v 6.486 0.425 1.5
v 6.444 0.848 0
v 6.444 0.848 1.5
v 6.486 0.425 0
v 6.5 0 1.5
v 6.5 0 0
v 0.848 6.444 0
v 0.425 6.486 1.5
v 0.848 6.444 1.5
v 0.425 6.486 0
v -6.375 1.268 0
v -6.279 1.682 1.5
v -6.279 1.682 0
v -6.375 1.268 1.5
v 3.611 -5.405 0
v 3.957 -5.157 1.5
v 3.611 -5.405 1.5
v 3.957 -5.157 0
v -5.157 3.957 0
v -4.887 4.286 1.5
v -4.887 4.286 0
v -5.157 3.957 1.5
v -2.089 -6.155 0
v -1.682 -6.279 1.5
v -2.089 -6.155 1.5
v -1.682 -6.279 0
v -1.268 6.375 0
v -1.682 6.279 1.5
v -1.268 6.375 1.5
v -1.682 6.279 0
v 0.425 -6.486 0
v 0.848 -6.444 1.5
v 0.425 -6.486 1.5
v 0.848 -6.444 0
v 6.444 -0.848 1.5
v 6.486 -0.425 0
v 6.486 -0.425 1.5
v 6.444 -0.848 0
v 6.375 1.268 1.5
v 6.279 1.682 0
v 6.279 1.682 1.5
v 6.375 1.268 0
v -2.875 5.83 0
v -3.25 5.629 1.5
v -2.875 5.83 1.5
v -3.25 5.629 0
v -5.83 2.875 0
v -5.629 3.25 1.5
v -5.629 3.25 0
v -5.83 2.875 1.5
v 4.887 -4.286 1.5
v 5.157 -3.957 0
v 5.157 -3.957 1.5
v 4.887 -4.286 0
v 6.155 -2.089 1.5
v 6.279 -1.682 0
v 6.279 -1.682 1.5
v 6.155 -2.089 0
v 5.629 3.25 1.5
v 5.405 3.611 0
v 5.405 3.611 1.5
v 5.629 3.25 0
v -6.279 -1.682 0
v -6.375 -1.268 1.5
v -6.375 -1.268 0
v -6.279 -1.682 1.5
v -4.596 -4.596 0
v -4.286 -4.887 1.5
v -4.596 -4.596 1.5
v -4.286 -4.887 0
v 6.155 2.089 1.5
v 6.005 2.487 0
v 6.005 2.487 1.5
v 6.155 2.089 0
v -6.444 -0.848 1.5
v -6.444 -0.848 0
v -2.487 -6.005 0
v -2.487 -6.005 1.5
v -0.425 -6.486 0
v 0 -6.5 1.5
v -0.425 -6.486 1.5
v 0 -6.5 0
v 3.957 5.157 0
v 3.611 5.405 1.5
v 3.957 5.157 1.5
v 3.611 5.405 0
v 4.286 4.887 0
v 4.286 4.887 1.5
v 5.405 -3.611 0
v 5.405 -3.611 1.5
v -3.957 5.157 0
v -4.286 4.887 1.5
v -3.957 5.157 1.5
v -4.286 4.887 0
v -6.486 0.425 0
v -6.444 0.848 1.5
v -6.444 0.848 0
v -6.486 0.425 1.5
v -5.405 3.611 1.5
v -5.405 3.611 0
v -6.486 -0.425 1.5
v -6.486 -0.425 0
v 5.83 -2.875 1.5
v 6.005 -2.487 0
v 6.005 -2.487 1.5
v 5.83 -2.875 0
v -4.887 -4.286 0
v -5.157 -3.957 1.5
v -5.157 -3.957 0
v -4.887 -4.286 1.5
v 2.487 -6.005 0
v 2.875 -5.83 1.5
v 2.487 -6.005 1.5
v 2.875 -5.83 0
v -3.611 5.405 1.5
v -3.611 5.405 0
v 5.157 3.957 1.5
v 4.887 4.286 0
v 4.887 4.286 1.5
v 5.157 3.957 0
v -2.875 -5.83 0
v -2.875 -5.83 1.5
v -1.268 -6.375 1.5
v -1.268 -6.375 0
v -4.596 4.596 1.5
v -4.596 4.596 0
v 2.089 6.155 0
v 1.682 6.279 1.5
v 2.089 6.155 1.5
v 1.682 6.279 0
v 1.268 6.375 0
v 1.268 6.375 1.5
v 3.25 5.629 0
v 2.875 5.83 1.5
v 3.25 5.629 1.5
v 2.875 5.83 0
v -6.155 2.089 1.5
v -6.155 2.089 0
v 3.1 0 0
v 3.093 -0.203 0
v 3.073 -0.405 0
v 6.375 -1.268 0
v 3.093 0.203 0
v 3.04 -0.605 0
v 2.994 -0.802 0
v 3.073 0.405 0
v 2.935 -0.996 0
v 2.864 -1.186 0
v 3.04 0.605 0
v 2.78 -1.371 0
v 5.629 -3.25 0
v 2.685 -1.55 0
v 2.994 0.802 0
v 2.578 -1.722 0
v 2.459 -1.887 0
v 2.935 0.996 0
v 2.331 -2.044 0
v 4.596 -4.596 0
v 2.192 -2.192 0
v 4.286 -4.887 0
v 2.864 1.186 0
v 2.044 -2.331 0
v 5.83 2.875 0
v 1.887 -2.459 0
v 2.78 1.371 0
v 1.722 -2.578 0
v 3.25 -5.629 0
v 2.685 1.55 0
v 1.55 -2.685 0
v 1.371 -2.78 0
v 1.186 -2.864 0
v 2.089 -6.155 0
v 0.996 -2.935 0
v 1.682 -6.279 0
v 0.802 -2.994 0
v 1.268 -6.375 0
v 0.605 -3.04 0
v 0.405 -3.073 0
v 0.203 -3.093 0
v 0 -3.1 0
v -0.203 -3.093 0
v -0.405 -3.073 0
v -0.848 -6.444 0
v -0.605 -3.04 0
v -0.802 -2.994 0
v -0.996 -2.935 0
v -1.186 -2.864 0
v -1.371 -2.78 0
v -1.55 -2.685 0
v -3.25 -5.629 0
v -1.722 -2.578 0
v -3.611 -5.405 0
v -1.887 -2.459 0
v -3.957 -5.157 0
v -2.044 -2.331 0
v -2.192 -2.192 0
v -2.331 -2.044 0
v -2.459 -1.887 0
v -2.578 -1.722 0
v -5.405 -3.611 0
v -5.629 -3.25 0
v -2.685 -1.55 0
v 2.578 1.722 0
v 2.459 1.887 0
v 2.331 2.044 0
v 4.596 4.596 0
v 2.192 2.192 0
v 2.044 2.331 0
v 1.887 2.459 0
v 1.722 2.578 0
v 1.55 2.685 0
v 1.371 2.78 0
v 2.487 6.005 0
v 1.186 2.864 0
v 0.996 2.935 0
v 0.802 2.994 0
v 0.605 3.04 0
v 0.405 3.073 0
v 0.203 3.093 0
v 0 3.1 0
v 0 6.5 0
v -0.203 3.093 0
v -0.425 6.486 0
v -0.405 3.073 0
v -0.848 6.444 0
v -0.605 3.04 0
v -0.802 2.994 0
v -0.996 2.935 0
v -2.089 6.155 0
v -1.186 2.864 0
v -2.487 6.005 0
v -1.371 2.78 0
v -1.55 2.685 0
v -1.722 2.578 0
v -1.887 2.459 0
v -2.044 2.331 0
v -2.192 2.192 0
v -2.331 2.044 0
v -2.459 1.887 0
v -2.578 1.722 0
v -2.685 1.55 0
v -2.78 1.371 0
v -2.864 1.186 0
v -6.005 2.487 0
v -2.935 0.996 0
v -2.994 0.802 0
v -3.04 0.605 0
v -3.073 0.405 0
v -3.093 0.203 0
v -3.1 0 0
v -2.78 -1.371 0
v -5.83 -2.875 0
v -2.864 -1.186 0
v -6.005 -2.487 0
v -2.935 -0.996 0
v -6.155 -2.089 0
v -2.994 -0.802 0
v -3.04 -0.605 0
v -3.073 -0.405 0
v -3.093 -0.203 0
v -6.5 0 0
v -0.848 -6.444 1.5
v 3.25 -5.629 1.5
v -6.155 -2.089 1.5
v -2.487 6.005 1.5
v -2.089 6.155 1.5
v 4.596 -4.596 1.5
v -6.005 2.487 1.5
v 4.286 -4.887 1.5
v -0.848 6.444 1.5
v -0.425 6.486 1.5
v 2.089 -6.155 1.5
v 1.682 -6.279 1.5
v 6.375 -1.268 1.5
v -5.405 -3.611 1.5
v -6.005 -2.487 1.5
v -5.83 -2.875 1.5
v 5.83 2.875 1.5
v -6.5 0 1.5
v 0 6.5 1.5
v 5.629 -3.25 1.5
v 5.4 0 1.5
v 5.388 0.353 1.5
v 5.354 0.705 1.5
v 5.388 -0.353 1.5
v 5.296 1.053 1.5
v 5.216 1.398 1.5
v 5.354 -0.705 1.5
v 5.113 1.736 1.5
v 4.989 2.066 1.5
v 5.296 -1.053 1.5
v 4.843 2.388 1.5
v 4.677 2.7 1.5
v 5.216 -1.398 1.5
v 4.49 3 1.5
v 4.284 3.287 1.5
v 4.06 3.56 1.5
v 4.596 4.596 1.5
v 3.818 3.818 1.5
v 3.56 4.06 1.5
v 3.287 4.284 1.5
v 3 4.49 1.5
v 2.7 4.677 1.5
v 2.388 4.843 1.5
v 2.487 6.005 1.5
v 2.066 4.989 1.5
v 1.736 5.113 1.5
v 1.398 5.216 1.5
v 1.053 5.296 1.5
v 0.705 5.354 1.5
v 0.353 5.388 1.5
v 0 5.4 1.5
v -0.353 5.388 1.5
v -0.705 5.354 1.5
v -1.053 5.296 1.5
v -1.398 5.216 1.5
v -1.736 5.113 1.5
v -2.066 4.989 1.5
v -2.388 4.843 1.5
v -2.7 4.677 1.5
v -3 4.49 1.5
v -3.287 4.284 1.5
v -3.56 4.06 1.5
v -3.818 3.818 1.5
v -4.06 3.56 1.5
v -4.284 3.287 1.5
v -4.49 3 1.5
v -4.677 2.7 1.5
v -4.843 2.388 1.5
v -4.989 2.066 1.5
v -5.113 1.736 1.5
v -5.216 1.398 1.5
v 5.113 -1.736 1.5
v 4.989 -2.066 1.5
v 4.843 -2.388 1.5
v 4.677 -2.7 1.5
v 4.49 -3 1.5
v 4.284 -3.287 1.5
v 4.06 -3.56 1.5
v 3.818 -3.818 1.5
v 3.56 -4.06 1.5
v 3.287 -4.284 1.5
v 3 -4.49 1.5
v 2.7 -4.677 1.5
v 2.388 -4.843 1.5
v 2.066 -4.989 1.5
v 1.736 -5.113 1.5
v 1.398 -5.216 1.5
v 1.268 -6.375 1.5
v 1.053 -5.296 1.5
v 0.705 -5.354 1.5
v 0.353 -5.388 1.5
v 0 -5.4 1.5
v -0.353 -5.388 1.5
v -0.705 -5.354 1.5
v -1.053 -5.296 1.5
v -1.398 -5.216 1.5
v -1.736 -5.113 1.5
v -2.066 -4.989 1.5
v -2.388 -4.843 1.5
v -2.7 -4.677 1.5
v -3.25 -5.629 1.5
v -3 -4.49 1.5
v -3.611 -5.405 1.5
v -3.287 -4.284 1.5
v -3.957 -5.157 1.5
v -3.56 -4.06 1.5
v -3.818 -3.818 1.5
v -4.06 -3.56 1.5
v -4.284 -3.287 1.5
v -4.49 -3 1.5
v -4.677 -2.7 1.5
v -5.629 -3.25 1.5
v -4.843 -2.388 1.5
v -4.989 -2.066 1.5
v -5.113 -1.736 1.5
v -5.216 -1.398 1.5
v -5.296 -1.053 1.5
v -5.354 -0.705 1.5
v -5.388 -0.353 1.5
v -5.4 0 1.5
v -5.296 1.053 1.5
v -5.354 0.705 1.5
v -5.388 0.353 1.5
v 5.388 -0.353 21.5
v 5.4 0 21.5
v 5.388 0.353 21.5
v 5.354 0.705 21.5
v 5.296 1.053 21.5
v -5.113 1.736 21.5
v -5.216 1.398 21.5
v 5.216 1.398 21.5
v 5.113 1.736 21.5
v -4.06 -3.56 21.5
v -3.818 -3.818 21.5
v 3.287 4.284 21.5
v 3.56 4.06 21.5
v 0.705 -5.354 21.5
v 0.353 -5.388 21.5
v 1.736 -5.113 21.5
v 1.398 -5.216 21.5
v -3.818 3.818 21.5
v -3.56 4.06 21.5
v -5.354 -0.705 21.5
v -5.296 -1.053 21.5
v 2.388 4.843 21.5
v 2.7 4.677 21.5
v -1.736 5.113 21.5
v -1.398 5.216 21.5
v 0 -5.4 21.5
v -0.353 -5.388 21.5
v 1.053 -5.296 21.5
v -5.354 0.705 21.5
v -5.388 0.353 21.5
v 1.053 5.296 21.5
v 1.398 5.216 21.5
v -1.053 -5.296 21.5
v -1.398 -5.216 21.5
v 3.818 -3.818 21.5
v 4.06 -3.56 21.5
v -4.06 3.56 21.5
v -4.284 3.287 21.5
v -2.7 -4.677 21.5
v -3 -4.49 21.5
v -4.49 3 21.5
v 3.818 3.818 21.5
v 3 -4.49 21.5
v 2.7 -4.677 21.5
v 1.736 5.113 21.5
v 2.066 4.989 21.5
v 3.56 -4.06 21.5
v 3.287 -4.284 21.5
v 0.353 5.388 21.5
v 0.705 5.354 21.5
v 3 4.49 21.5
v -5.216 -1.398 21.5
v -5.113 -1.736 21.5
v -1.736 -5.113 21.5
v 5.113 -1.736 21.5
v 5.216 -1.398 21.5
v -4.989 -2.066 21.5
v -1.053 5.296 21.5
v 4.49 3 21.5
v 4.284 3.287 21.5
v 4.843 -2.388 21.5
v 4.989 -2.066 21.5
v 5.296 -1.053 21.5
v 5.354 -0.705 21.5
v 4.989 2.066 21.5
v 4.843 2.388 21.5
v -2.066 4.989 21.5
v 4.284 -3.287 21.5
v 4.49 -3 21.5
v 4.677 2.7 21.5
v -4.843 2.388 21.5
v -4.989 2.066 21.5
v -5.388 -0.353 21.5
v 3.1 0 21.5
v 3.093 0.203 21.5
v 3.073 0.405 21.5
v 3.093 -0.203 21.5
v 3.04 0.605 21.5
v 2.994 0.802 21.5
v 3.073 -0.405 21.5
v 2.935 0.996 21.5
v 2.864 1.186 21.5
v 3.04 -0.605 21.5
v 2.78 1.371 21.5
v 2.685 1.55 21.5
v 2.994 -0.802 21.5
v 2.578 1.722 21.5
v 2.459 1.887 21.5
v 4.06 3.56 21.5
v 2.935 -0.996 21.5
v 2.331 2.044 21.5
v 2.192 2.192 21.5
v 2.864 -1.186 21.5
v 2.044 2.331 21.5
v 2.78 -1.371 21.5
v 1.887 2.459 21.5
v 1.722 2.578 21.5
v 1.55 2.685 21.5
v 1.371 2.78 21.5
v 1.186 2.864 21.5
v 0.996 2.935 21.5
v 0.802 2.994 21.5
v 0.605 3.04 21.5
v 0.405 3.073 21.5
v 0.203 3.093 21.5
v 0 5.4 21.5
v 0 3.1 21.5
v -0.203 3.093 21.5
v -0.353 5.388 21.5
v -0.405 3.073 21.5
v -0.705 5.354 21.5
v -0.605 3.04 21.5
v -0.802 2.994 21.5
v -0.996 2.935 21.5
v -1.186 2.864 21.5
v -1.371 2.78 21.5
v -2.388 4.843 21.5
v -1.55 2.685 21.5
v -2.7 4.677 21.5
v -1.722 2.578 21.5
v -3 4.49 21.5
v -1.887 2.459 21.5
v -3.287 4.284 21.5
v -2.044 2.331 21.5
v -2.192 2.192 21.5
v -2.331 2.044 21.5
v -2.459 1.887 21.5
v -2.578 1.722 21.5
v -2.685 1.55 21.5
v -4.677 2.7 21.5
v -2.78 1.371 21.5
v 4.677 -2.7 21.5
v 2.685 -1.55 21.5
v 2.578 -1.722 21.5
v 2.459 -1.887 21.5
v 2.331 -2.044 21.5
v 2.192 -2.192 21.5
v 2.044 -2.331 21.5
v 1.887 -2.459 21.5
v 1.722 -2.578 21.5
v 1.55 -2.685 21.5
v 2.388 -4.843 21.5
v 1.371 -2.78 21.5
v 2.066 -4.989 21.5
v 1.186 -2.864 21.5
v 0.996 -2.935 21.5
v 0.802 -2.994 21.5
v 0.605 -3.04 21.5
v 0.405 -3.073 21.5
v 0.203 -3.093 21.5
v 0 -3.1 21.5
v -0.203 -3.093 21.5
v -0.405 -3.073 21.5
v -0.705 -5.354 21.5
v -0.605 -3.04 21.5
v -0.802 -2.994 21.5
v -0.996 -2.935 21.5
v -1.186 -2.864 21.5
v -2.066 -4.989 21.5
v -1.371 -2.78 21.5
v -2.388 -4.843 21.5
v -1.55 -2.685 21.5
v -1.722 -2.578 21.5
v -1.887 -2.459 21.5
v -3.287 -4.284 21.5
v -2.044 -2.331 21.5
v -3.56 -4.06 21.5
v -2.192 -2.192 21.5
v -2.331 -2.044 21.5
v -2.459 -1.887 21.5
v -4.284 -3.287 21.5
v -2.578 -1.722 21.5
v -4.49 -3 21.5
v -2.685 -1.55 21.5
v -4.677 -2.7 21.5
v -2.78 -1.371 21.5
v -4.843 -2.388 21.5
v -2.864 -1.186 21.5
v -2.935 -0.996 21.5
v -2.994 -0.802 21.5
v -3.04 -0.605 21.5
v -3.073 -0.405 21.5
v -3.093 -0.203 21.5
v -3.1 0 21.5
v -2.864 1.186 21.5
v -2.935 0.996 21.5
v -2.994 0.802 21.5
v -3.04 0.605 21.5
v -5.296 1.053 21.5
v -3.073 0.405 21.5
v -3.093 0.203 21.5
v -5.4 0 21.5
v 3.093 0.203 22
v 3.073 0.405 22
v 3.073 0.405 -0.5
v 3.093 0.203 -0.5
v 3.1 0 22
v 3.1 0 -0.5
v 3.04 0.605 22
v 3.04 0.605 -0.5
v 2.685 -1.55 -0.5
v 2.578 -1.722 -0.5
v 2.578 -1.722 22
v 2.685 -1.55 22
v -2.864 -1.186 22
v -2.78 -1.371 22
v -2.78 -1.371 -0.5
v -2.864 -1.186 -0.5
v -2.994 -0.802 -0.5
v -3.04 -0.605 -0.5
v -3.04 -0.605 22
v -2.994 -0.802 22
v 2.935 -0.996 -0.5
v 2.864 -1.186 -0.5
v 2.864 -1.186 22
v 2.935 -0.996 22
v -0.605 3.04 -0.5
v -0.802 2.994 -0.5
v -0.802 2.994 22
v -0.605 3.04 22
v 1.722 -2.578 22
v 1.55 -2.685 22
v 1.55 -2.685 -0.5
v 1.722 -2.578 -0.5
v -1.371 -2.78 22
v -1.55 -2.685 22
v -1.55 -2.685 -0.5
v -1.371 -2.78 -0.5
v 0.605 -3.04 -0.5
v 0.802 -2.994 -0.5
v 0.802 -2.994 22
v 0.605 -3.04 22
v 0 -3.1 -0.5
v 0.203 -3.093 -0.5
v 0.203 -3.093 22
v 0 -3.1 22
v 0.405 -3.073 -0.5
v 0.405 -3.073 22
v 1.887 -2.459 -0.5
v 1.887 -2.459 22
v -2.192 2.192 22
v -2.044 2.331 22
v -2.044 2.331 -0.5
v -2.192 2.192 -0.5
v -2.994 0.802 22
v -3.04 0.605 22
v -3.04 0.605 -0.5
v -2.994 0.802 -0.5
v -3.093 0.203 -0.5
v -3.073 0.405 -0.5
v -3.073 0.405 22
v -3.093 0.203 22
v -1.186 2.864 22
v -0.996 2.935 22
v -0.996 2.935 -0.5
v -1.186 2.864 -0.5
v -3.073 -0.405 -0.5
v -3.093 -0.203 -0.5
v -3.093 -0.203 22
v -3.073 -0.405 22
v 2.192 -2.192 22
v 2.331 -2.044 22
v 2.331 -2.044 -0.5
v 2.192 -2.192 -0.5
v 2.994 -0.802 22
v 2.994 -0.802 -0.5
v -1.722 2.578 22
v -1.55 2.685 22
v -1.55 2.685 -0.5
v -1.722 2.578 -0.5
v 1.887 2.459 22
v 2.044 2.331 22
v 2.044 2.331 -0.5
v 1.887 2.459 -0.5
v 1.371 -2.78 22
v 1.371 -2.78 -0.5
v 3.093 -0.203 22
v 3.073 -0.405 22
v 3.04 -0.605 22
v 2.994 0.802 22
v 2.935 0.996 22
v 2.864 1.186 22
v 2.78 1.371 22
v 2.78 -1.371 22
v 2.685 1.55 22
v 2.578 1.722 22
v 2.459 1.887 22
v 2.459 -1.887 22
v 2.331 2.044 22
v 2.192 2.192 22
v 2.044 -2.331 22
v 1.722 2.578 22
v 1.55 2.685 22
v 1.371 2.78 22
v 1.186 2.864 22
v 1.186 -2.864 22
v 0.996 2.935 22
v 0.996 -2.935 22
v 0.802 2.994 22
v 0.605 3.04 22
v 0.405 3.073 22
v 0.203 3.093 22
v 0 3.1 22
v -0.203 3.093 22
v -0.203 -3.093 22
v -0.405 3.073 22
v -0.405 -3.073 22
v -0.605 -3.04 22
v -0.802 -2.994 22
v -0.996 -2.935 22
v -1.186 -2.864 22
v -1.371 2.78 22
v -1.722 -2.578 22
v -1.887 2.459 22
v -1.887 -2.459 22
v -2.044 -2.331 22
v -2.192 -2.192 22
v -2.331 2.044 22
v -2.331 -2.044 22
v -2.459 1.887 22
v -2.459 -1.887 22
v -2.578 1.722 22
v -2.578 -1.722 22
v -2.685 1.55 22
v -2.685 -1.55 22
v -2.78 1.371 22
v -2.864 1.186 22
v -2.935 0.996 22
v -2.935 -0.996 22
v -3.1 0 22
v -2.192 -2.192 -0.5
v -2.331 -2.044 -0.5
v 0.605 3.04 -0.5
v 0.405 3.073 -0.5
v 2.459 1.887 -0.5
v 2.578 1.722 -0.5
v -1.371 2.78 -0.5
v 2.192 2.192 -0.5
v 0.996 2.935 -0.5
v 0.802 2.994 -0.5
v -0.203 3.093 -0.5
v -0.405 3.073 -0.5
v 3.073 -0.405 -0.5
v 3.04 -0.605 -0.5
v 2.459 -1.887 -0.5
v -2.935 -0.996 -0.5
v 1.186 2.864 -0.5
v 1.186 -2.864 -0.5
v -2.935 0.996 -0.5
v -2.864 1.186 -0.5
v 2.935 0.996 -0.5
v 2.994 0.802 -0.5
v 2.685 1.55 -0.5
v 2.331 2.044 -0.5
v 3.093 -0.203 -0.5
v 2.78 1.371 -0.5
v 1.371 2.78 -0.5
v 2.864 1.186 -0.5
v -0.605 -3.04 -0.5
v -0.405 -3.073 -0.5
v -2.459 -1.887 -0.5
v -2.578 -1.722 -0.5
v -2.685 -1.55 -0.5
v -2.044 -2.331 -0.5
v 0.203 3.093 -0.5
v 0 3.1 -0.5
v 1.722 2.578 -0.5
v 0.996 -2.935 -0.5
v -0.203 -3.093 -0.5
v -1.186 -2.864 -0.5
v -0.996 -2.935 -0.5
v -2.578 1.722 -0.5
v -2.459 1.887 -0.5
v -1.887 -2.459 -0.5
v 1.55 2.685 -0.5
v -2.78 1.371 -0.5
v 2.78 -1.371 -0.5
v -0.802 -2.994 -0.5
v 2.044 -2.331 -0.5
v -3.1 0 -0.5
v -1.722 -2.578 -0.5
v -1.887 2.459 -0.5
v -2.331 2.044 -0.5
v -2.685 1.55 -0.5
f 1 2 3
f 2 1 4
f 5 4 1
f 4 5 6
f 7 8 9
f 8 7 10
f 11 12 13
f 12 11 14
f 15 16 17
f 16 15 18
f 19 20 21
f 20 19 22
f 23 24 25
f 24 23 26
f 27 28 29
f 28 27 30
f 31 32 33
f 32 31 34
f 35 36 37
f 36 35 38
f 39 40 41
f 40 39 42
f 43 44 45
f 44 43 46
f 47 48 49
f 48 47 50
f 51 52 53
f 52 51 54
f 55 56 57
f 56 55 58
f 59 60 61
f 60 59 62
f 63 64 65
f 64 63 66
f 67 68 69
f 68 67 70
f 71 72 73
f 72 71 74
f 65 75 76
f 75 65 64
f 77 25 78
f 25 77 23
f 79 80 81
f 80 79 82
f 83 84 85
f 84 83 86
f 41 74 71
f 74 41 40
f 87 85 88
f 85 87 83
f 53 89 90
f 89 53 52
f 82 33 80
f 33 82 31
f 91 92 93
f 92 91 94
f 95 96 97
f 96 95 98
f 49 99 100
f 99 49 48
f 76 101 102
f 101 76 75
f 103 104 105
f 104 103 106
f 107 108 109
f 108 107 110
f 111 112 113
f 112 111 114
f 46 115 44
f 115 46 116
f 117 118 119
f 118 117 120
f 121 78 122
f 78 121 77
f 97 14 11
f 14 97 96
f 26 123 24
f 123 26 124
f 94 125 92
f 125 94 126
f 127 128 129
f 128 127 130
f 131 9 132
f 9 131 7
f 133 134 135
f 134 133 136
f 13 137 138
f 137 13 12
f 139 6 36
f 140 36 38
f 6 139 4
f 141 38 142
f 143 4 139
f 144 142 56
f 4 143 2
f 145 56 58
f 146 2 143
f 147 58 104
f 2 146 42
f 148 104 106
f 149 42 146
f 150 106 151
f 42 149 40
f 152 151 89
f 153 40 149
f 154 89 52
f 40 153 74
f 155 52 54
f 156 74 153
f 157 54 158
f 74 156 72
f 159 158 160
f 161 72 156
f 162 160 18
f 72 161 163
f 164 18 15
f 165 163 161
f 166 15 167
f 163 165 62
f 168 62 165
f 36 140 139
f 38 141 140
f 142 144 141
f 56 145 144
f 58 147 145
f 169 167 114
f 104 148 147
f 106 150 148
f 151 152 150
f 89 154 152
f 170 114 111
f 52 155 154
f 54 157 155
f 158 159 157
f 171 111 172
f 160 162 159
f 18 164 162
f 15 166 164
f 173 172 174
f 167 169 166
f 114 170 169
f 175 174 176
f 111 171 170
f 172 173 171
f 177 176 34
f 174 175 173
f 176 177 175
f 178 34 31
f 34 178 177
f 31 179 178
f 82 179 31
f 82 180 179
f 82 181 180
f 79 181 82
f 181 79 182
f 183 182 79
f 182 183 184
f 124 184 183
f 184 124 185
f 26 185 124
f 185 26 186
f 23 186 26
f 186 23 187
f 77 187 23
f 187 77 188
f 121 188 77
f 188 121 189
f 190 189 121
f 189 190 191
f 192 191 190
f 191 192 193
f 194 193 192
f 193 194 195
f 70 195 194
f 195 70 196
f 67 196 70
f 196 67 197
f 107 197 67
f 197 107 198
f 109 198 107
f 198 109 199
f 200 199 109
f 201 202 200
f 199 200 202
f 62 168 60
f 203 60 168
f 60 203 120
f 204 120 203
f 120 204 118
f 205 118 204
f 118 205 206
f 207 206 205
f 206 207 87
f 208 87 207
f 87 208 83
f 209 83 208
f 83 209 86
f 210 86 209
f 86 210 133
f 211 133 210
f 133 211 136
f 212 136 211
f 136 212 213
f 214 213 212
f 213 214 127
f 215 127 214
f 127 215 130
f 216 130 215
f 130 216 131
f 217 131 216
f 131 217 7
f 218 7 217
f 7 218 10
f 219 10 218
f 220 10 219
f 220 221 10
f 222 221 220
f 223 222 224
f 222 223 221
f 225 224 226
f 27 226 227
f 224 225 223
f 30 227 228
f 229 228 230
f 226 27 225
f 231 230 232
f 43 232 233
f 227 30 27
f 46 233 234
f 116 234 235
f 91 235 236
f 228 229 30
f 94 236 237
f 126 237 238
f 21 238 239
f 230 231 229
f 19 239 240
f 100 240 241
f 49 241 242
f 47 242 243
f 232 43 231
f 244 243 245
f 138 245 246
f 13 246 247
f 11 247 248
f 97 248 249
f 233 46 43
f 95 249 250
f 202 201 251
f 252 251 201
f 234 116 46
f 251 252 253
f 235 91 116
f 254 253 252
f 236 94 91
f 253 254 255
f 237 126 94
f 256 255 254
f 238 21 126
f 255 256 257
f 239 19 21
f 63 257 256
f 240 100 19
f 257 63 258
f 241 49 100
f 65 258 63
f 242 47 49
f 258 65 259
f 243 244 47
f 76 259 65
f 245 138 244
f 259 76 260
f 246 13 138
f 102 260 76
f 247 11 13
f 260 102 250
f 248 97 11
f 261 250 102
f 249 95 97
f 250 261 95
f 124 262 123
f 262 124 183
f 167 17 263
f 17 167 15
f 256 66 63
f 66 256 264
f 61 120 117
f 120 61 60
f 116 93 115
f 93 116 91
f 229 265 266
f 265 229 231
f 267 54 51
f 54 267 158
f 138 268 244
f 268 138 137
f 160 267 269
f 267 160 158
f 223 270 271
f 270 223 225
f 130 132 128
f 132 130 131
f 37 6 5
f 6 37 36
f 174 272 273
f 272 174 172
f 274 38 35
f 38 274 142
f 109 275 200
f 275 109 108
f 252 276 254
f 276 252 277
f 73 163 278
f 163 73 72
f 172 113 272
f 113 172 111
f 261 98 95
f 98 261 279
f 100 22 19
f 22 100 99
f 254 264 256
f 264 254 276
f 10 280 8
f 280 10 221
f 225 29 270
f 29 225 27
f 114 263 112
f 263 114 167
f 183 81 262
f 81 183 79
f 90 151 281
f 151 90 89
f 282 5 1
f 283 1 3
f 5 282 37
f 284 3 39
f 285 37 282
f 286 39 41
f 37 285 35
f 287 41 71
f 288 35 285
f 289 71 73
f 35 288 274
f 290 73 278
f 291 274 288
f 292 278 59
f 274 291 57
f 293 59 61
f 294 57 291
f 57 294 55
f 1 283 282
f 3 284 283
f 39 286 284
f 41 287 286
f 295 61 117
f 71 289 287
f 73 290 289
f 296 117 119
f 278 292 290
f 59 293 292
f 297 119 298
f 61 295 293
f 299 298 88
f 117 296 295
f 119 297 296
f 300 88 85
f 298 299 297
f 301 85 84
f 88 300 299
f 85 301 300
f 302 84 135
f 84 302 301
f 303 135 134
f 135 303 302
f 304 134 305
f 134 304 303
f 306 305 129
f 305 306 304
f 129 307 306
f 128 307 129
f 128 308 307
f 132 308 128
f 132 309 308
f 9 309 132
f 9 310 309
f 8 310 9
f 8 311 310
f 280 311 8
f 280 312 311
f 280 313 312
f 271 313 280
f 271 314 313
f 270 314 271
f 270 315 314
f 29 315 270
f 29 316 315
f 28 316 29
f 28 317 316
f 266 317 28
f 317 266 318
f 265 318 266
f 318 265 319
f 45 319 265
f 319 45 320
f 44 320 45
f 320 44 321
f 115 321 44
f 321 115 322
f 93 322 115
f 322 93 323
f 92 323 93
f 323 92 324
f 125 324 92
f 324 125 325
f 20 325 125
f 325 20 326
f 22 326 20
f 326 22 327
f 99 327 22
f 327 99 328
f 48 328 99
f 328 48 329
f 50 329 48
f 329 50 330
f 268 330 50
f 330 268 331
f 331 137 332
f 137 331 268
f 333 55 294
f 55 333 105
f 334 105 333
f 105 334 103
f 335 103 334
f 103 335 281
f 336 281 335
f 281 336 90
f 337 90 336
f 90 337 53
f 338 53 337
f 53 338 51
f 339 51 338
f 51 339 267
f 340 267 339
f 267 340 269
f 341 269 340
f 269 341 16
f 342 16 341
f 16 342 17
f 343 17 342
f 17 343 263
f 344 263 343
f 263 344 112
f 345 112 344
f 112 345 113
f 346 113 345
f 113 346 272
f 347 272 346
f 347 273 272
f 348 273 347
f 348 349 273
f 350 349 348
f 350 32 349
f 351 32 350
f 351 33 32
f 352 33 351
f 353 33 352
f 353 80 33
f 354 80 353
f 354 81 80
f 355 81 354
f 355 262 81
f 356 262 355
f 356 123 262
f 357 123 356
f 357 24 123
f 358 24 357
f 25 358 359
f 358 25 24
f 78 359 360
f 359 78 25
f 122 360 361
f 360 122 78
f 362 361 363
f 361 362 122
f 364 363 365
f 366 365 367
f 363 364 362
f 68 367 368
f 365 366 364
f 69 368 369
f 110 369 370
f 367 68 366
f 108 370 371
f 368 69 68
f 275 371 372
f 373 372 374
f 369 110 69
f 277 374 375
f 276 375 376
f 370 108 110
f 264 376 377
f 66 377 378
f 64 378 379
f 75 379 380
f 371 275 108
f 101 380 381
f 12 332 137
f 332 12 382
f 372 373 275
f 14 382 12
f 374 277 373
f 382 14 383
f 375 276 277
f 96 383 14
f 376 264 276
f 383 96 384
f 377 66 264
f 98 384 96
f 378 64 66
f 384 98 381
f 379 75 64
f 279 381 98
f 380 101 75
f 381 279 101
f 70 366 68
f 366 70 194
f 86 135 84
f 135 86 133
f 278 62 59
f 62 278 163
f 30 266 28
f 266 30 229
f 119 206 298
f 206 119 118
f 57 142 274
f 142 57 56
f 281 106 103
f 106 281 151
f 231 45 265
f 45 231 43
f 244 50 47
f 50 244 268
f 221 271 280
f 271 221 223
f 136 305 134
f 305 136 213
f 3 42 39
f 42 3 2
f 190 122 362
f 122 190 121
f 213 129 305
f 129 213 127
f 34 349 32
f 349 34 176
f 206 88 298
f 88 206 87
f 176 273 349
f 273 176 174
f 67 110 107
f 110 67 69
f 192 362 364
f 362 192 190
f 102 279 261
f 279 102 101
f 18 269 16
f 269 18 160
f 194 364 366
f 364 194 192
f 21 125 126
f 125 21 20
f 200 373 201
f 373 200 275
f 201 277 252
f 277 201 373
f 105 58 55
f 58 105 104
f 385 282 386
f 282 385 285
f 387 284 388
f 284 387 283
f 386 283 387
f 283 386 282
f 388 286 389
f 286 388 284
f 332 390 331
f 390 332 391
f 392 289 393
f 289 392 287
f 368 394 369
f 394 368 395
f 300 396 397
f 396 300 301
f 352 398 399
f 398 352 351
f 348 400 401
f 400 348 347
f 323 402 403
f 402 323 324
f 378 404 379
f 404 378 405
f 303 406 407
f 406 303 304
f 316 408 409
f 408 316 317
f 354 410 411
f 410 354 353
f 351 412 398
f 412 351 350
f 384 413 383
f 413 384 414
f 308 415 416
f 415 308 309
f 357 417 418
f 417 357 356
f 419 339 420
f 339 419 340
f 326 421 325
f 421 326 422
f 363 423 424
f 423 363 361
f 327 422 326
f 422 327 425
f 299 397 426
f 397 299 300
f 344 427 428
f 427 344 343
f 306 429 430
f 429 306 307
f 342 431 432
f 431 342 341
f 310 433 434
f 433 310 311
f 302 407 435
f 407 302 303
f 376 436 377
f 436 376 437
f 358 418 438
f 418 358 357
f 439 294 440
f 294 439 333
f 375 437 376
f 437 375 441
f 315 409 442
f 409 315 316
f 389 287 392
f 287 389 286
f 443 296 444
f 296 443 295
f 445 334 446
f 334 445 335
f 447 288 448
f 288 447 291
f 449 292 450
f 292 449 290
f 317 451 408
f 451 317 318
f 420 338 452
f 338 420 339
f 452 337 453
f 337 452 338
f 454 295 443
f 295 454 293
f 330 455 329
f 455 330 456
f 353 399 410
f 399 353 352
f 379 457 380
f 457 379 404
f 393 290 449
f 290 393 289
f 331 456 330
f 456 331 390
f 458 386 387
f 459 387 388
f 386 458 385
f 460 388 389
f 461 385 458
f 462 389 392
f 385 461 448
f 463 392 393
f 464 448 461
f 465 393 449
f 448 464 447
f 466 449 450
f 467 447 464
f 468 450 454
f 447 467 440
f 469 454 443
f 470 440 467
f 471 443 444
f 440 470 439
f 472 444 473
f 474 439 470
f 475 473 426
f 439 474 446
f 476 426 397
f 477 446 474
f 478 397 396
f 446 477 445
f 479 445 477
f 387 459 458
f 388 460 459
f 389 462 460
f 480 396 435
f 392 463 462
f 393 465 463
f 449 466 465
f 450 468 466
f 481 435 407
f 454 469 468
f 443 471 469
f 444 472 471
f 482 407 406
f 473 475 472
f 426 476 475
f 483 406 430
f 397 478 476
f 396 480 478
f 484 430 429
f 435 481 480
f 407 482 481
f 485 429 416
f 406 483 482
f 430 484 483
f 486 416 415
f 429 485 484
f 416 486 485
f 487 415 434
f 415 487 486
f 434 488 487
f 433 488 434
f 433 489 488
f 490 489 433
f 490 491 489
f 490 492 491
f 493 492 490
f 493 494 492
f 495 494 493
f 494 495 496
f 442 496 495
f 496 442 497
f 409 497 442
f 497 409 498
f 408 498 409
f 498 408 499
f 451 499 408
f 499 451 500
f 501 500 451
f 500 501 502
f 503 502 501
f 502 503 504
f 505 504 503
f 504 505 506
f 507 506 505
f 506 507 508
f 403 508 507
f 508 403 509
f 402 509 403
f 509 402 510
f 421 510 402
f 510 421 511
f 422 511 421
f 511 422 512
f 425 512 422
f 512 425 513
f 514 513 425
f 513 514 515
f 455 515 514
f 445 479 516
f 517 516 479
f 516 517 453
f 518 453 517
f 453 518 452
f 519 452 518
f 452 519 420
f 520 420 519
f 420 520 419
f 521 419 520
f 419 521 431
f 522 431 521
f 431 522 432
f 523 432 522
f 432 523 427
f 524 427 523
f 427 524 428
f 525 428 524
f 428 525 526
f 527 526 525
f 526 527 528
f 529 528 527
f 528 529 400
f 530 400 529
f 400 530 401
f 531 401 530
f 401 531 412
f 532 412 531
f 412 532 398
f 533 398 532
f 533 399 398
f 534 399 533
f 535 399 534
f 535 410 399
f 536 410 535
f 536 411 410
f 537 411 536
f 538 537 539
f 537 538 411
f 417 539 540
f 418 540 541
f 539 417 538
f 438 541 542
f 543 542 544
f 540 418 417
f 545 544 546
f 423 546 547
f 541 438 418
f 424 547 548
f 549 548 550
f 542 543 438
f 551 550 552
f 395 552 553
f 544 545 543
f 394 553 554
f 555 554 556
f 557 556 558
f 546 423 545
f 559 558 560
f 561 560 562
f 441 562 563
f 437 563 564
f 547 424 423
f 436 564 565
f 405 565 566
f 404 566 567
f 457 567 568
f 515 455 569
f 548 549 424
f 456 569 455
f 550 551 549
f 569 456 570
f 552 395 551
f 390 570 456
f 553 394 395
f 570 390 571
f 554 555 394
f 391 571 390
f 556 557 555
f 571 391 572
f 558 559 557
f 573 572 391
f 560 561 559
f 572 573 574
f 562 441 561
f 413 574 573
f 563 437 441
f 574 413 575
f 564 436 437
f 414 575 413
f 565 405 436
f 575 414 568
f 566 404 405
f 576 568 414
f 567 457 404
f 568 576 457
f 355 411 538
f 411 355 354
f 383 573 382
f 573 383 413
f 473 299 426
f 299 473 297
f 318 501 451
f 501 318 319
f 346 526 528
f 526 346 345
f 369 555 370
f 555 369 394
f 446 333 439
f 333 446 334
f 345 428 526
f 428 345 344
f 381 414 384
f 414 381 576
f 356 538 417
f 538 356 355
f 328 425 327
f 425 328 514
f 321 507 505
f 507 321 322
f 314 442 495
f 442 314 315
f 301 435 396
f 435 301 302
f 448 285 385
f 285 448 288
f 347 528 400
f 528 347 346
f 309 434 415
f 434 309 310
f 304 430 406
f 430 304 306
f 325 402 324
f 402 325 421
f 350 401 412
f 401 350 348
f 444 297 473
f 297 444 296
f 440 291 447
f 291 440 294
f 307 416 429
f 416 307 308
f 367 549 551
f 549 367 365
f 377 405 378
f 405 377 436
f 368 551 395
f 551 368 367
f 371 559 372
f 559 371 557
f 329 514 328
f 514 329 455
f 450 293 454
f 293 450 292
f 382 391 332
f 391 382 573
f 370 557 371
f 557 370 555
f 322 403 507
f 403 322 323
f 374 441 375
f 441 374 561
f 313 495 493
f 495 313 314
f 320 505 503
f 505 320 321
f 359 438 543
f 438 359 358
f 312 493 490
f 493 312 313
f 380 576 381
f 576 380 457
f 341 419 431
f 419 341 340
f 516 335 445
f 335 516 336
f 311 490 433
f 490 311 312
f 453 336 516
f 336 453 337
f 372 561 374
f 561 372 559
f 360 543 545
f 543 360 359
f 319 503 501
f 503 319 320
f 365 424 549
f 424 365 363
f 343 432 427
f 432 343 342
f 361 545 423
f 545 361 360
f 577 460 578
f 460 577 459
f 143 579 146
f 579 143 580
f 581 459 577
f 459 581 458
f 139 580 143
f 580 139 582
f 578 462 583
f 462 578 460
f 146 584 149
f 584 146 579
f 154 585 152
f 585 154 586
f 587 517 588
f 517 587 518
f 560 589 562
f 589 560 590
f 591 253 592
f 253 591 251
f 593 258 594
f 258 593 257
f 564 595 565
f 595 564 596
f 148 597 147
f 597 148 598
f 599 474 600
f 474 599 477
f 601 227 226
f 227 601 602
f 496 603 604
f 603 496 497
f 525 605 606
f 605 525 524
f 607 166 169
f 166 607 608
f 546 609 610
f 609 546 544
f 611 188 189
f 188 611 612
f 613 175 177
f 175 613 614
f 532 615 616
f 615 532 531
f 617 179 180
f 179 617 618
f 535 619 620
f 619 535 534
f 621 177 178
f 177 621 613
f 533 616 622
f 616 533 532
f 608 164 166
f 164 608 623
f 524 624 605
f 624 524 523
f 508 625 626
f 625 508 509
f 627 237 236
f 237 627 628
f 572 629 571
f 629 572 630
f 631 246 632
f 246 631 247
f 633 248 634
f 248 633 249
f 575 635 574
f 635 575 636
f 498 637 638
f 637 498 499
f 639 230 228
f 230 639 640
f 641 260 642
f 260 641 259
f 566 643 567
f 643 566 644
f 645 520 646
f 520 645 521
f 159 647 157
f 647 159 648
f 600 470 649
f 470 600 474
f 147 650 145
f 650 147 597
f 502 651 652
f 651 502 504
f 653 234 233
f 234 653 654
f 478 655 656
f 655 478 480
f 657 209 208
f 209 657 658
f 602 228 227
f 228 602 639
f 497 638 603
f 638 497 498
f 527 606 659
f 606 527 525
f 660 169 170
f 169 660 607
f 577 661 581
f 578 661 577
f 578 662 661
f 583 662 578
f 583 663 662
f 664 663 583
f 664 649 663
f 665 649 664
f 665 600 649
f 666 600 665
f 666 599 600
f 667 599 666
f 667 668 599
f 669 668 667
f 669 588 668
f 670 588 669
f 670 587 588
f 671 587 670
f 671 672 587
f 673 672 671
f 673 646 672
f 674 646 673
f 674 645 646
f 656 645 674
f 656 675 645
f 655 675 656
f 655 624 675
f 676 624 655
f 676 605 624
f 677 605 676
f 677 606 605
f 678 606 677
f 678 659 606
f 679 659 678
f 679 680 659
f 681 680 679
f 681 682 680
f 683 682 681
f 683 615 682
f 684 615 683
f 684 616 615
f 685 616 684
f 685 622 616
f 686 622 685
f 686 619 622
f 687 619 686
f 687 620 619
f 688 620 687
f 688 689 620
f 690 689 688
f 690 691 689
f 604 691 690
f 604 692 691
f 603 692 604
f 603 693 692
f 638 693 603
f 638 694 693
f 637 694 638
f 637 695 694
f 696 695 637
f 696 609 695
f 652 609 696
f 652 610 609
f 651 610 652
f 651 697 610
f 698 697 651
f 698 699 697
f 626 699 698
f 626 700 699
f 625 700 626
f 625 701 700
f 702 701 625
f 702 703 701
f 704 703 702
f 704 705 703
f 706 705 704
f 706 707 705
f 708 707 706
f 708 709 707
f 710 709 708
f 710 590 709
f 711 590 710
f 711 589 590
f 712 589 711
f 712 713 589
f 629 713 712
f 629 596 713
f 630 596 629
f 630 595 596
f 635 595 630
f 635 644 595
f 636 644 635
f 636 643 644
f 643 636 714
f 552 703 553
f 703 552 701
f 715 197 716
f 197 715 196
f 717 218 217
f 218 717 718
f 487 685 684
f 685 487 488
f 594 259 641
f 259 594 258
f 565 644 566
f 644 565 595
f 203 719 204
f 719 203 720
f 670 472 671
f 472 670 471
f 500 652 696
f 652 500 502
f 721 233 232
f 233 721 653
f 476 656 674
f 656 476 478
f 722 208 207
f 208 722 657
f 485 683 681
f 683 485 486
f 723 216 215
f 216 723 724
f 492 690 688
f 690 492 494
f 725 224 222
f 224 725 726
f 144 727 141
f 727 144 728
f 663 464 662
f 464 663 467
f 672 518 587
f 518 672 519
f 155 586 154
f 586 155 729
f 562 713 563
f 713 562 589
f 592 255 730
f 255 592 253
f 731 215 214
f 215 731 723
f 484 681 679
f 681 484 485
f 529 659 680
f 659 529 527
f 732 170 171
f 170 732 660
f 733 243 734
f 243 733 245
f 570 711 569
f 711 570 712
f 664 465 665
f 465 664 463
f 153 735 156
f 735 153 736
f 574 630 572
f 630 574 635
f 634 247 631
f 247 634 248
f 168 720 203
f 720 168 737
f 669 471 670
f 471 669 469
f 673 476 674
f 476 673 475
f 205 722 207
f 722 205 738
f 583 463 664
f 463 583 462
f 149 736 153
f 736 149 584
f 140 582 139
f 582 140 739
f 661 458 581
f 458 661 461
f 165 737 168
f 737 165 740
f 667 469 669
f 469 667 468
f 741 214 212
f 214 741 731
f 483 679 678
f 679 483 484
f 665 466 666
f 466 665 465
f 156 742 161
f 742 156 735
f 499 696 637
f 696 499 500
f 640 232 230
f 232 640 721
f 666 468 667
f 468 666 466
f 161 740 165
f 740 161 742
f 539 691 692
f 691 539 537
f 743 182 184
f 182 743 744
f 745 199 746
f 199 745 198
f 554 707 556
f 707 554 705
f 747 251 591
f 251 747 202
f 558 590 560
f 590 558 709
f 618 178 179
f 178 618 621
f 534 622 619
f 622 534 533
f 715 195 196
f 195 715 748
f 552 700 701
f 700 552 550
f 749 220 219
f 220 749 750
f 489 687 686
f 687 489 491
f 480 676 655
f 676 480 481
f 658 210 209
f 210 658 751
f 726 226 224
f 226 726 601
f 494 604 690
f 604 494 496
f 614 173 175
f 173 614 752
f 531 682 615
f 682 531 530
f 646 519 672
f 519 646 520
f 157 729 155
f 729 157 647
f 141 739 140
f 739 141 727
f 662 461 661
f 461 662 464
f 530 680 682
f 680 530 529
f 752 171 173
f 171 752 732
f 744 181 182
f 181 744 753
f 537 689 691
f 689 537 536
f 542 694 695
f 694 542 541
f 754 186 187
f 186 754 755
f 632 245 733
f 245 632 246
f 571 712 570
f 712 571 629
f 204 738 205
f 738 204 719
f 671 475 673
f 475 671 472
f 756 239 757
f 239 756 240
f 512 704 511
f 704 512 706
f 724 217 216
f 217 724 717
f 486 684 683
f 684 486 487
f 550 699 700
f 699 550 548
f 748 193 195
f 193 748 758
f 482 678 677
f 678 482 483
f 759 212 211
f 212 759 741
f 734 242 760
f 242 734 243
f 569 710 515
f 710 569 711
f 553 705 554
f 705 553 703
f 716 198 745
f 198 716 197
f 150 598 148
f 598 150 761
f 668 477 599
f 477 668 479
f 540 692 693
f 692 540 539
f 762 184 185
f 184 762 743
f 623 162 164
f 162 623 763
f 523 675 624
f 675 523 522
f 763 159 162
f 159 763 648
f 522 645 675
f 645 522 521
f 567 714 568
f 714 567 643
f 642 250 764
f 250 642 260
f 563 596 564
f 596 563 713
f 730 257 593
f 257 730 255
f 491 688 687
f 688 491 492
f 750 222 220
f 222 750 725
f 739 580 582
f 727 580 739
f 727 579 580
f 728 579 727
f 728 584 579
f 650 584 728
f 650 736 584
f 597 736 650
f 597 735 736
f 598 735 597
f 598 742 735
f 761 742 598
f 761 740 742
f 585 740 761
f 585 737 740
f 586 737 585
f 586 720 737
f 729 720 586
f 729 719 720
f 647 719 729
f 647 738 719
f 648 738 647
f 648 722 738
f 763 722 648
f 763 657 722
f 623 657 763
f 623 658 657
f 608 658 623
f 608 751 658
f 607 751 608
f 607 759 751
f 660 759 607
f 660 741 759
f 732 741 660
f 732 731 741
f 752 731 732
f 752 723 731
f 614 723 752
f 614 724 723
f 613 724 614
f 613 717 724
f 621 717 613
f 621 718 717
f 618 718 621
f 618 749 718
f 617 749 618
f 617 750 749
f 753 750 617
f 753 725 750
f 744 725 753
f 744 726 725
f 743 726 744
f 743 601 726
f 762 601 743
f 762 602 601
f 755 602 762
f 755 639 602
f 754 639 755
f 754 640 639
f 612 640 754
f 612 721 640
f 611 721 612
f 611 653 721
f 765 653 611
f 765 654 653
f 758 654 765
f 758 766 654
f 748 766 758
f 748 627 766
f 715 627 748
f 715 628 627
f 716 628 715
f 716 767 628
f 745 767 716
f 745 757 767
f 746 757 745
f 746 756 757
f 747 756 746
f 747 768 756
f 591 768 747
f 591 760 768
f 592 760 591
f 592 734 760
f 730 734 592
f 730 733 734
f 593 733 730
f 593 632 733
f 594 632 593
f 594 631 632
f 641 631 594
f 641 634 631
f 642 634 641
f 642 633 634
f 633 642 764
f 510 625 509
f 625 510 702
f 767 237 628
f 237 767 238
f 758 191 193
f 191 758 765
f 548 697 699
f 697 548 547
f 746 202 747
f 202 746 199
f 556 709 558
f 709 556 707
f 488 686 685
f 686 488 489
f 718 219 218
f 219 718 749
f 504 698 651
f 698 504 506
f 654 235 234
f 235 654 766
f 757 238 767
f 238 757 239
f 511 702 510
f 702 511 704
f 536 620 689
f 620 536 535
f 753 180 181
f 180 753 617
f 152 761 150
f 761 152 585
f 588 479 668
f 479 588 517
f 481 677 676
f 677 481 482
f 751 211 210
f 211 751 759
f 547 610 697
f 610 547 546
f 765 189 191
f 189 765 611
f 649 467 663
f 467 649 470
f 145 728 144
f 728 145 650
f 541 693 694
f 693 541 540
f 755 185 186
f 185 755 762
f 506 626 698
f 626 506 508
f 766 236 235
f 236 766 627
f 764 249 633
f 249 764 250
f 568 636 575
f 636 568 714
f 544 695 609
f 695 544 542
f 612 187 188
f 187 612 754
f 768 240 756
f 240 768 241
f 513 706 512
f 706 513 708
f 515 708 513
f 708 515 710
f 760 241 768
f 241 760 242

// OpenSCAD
// PCR tube adapter sleeve: fits a 0.2 mL tube in a 1.5 mL rack hole
// Print orientation: collar on the bed (z = 0), sleeve body rises to z = 21.5

// ---------- Parameters ----------
collar_d        = 13;     // collar outer diameter
collar_t        = 1.5;    // collar thickness (z = 0 to 1.5)
sleeve_od       = 10.8;   // sleeve body outer diameter
sleeve_h        = 20;     // sleeve body height above collar (z = 1.5 to 21.5)
bore_d          = 6.2;    // through-bore diameter
eps             = 0.5;    // cutter overshoot past faces

$fn = 96;

// ---------- Model ----------
union() {
    // Collar
    cylinder(d = collar_d, h = collar_t);

    // Sleeve body (slightly overlapping the collar for a clean union)
    translate([0, 0, collar_t - 0.01])
        cylinder(d = sleeve_od, h = sleeve_h + 0.01);

    // Through-bore
    translate([0, 0, -eps])
        cylinder(d = bore_d, h = collar_t + sleeve_h + 2 * eps);
}
